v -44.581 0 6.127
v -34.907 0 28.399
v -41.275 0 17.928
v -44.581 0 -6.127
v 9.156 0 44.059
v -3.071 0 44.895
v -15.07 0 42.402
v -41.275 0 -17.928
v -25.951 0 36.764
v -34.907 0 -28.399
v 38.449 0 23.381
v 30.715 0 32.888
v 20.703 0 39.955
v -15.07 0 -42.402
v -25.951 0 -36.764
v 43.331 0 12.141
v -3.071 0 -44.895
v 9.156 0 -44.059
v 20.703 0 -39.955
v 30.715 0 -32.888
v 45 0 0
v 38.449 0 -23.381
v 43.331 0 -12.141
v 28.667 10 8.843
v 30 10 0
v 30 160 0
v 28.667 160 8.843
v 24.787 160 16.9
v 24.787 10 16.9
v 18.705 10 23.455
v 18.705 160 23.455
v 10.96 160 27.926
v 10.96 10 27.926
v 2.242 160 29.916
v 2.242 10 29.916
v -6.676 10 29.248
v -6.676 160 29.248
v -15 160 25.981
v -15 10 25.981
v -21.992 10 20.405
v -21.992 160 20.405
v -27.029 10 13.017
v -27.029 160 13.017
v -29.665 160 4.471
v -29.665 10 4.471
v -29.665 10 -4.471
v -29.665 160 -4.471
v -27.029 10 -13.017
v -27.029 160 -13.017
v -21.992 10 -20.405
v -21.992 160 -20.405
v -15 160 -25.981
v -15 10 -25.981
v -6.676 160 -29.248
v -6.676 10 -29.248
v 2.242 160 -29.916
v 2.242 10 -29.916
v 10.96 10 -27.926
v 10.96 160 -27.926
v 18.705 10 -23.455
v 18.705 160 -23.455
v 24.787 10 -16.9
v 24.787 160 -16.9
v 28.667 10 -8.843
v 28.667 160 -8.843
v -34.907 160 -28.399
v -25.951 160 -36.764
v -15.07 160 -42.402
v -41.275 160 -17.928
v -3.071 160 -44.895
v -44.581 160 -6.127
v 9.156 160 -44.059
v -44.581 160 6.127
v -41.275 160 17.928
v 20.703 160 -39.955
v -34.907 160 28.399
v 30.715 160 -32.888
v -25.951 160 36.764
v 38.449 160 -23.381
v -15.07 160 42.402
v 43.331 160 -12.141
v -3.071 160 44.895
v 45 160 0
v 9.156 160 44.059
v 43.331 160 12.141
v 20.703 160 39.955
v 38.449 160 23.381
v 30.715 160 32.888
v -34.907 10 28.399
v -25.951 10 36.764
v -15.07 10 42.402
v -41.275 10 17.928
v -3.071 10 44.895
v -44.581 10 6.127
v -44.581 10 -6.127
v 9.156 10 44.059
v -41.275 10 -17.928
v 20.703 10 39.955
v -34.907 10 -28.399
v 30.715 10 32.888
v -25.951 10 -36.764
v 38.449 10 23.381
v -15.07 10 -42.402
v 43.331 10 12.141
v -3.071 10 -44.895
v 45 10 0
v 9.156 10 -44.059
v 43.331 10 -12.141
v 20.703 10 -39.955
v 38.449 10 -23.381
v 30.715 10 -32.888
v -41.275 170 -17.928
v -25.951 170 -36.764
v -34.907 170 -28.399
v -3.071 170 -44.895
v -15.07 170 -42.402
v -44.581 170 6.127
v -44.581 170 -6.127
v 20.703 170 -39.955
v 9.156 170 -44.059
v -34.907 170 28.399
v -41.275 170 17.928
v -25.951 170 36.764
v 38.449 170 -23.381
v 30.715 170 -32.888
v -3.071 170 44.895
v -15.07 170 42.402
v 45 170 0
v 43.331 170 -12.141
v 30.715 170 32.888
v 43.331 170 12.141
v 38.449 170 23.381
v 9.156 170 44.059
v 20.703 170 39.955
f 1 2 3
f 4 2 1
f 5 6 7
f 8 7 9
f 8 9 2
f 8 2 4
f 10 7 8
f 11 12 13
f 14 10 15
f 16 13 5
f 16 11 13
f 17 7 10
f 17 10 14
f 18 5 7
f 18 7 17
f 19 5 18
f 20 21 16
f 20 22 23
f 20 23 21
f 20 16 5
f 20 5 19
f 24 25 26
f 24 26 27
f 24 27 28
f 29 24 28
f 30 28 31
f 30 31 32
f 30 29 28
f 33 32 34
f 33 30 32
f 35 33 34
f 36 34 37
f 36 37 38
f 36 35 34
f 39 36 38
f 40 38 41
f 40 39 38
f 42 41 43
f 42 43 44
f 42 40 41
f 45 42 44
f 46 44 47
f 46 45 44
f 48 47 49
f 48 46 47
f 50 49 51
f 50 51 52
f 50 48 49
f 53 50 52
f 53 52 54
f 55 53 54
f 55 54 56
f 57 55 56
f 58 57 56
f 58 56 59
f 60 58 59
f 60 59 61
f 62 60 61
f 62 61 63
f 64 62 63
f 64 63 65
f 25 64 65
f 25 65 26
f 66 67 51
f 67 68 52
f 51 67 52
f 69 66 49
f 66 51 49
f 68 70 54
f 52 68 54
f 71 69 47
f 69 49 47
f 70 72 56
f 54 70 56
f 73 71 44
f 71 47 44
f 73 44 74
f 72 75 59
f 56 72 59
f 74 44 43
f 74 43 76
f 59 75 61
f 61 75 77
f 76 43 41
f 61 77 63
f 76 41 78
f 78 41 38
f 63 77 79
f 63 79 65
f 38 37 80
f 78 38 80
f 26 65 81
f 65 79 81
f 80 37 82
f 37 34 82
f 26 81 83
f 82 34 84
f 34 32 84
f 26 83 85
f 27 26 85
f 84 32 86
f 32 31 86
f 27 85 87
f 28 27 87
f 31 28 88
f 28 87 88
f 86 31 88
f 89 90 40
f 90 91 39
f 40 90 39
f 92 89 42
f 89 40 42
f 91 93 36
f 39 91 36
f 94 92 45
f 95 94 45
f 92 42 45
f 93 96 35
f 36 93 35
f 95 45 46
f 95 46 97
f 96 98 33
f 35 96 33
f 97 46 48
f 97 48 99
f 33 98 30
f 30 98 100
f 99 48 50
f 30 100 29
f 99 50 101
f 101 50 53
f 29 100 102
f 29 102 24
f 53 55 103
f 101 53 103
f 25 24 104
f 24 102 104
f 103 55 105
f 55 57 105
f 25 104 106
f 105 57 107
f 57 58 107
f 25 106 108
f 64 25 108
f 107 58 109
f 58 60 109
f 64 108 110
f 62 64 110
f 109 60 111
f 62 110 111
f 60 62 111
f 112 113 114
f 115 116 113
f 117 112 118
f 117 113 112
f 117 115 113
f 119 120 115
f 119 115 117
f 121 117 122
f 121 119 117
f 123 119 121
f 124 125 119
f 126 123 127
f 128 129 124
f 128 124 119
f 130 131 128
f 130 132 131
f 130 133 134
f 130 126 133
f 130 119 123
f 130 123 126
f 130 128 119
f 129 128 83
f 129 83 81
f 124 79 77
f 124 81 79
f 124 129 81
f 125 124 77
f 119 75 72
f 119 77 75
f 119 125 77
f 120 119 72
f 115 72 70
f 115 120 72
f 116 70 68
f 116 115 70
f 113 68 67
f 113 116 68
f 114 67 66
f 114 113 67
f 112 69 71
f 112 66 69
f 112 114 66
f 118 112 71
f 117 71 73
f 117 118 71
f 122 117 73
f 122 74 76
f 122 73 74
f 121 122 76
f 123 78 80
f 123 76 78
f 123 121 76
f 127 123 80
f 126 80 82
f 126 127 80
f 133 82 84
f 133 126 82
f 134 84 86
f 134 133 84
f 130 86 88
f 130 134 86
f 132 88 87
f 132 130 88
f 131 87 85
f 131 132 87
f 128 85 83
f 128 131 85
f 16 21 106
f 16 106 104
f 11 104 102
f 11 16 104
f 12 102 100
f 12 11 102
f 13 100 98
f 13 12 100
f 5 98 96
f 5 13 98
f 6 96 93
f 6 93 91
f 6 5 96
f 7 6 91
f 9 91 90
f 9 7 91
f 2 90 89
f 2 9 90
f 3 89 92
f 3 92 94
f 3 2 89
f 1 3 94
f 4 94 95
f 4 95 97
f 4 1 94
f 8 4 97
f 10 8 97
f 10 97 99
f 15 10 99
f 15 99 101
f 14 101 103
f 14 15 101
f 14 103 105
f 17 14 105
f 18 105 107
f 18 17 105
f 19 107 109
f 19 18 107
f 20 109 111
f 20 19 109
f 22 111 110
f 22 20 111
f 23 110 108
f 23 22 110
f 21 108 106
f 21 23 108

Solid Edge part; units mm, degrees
sketch "Sketch1" plane through (0, 0, 0) normal (0, -1, 0) x (1, 0, 0)
  circle A0 centre (0, 0) radius 30
extrude "Protrusion1" add sketch "Sketch1" against normal blind 170
sketch "Sketch2" plane through (0, 0, 0) normal (0, -1, 0) x (1, 0, 0)
  circle A0 centre (0, 0) radius 45
  dimension "D1" = 90
extrude "ExtrudedProtrusion_2" add sketch "Sketch2" against normal blind 10
mirror "Mirror1" about plane through (0, 85, 0) normal (0, -1, 0) of "ExtrudedProtrusion_2"
